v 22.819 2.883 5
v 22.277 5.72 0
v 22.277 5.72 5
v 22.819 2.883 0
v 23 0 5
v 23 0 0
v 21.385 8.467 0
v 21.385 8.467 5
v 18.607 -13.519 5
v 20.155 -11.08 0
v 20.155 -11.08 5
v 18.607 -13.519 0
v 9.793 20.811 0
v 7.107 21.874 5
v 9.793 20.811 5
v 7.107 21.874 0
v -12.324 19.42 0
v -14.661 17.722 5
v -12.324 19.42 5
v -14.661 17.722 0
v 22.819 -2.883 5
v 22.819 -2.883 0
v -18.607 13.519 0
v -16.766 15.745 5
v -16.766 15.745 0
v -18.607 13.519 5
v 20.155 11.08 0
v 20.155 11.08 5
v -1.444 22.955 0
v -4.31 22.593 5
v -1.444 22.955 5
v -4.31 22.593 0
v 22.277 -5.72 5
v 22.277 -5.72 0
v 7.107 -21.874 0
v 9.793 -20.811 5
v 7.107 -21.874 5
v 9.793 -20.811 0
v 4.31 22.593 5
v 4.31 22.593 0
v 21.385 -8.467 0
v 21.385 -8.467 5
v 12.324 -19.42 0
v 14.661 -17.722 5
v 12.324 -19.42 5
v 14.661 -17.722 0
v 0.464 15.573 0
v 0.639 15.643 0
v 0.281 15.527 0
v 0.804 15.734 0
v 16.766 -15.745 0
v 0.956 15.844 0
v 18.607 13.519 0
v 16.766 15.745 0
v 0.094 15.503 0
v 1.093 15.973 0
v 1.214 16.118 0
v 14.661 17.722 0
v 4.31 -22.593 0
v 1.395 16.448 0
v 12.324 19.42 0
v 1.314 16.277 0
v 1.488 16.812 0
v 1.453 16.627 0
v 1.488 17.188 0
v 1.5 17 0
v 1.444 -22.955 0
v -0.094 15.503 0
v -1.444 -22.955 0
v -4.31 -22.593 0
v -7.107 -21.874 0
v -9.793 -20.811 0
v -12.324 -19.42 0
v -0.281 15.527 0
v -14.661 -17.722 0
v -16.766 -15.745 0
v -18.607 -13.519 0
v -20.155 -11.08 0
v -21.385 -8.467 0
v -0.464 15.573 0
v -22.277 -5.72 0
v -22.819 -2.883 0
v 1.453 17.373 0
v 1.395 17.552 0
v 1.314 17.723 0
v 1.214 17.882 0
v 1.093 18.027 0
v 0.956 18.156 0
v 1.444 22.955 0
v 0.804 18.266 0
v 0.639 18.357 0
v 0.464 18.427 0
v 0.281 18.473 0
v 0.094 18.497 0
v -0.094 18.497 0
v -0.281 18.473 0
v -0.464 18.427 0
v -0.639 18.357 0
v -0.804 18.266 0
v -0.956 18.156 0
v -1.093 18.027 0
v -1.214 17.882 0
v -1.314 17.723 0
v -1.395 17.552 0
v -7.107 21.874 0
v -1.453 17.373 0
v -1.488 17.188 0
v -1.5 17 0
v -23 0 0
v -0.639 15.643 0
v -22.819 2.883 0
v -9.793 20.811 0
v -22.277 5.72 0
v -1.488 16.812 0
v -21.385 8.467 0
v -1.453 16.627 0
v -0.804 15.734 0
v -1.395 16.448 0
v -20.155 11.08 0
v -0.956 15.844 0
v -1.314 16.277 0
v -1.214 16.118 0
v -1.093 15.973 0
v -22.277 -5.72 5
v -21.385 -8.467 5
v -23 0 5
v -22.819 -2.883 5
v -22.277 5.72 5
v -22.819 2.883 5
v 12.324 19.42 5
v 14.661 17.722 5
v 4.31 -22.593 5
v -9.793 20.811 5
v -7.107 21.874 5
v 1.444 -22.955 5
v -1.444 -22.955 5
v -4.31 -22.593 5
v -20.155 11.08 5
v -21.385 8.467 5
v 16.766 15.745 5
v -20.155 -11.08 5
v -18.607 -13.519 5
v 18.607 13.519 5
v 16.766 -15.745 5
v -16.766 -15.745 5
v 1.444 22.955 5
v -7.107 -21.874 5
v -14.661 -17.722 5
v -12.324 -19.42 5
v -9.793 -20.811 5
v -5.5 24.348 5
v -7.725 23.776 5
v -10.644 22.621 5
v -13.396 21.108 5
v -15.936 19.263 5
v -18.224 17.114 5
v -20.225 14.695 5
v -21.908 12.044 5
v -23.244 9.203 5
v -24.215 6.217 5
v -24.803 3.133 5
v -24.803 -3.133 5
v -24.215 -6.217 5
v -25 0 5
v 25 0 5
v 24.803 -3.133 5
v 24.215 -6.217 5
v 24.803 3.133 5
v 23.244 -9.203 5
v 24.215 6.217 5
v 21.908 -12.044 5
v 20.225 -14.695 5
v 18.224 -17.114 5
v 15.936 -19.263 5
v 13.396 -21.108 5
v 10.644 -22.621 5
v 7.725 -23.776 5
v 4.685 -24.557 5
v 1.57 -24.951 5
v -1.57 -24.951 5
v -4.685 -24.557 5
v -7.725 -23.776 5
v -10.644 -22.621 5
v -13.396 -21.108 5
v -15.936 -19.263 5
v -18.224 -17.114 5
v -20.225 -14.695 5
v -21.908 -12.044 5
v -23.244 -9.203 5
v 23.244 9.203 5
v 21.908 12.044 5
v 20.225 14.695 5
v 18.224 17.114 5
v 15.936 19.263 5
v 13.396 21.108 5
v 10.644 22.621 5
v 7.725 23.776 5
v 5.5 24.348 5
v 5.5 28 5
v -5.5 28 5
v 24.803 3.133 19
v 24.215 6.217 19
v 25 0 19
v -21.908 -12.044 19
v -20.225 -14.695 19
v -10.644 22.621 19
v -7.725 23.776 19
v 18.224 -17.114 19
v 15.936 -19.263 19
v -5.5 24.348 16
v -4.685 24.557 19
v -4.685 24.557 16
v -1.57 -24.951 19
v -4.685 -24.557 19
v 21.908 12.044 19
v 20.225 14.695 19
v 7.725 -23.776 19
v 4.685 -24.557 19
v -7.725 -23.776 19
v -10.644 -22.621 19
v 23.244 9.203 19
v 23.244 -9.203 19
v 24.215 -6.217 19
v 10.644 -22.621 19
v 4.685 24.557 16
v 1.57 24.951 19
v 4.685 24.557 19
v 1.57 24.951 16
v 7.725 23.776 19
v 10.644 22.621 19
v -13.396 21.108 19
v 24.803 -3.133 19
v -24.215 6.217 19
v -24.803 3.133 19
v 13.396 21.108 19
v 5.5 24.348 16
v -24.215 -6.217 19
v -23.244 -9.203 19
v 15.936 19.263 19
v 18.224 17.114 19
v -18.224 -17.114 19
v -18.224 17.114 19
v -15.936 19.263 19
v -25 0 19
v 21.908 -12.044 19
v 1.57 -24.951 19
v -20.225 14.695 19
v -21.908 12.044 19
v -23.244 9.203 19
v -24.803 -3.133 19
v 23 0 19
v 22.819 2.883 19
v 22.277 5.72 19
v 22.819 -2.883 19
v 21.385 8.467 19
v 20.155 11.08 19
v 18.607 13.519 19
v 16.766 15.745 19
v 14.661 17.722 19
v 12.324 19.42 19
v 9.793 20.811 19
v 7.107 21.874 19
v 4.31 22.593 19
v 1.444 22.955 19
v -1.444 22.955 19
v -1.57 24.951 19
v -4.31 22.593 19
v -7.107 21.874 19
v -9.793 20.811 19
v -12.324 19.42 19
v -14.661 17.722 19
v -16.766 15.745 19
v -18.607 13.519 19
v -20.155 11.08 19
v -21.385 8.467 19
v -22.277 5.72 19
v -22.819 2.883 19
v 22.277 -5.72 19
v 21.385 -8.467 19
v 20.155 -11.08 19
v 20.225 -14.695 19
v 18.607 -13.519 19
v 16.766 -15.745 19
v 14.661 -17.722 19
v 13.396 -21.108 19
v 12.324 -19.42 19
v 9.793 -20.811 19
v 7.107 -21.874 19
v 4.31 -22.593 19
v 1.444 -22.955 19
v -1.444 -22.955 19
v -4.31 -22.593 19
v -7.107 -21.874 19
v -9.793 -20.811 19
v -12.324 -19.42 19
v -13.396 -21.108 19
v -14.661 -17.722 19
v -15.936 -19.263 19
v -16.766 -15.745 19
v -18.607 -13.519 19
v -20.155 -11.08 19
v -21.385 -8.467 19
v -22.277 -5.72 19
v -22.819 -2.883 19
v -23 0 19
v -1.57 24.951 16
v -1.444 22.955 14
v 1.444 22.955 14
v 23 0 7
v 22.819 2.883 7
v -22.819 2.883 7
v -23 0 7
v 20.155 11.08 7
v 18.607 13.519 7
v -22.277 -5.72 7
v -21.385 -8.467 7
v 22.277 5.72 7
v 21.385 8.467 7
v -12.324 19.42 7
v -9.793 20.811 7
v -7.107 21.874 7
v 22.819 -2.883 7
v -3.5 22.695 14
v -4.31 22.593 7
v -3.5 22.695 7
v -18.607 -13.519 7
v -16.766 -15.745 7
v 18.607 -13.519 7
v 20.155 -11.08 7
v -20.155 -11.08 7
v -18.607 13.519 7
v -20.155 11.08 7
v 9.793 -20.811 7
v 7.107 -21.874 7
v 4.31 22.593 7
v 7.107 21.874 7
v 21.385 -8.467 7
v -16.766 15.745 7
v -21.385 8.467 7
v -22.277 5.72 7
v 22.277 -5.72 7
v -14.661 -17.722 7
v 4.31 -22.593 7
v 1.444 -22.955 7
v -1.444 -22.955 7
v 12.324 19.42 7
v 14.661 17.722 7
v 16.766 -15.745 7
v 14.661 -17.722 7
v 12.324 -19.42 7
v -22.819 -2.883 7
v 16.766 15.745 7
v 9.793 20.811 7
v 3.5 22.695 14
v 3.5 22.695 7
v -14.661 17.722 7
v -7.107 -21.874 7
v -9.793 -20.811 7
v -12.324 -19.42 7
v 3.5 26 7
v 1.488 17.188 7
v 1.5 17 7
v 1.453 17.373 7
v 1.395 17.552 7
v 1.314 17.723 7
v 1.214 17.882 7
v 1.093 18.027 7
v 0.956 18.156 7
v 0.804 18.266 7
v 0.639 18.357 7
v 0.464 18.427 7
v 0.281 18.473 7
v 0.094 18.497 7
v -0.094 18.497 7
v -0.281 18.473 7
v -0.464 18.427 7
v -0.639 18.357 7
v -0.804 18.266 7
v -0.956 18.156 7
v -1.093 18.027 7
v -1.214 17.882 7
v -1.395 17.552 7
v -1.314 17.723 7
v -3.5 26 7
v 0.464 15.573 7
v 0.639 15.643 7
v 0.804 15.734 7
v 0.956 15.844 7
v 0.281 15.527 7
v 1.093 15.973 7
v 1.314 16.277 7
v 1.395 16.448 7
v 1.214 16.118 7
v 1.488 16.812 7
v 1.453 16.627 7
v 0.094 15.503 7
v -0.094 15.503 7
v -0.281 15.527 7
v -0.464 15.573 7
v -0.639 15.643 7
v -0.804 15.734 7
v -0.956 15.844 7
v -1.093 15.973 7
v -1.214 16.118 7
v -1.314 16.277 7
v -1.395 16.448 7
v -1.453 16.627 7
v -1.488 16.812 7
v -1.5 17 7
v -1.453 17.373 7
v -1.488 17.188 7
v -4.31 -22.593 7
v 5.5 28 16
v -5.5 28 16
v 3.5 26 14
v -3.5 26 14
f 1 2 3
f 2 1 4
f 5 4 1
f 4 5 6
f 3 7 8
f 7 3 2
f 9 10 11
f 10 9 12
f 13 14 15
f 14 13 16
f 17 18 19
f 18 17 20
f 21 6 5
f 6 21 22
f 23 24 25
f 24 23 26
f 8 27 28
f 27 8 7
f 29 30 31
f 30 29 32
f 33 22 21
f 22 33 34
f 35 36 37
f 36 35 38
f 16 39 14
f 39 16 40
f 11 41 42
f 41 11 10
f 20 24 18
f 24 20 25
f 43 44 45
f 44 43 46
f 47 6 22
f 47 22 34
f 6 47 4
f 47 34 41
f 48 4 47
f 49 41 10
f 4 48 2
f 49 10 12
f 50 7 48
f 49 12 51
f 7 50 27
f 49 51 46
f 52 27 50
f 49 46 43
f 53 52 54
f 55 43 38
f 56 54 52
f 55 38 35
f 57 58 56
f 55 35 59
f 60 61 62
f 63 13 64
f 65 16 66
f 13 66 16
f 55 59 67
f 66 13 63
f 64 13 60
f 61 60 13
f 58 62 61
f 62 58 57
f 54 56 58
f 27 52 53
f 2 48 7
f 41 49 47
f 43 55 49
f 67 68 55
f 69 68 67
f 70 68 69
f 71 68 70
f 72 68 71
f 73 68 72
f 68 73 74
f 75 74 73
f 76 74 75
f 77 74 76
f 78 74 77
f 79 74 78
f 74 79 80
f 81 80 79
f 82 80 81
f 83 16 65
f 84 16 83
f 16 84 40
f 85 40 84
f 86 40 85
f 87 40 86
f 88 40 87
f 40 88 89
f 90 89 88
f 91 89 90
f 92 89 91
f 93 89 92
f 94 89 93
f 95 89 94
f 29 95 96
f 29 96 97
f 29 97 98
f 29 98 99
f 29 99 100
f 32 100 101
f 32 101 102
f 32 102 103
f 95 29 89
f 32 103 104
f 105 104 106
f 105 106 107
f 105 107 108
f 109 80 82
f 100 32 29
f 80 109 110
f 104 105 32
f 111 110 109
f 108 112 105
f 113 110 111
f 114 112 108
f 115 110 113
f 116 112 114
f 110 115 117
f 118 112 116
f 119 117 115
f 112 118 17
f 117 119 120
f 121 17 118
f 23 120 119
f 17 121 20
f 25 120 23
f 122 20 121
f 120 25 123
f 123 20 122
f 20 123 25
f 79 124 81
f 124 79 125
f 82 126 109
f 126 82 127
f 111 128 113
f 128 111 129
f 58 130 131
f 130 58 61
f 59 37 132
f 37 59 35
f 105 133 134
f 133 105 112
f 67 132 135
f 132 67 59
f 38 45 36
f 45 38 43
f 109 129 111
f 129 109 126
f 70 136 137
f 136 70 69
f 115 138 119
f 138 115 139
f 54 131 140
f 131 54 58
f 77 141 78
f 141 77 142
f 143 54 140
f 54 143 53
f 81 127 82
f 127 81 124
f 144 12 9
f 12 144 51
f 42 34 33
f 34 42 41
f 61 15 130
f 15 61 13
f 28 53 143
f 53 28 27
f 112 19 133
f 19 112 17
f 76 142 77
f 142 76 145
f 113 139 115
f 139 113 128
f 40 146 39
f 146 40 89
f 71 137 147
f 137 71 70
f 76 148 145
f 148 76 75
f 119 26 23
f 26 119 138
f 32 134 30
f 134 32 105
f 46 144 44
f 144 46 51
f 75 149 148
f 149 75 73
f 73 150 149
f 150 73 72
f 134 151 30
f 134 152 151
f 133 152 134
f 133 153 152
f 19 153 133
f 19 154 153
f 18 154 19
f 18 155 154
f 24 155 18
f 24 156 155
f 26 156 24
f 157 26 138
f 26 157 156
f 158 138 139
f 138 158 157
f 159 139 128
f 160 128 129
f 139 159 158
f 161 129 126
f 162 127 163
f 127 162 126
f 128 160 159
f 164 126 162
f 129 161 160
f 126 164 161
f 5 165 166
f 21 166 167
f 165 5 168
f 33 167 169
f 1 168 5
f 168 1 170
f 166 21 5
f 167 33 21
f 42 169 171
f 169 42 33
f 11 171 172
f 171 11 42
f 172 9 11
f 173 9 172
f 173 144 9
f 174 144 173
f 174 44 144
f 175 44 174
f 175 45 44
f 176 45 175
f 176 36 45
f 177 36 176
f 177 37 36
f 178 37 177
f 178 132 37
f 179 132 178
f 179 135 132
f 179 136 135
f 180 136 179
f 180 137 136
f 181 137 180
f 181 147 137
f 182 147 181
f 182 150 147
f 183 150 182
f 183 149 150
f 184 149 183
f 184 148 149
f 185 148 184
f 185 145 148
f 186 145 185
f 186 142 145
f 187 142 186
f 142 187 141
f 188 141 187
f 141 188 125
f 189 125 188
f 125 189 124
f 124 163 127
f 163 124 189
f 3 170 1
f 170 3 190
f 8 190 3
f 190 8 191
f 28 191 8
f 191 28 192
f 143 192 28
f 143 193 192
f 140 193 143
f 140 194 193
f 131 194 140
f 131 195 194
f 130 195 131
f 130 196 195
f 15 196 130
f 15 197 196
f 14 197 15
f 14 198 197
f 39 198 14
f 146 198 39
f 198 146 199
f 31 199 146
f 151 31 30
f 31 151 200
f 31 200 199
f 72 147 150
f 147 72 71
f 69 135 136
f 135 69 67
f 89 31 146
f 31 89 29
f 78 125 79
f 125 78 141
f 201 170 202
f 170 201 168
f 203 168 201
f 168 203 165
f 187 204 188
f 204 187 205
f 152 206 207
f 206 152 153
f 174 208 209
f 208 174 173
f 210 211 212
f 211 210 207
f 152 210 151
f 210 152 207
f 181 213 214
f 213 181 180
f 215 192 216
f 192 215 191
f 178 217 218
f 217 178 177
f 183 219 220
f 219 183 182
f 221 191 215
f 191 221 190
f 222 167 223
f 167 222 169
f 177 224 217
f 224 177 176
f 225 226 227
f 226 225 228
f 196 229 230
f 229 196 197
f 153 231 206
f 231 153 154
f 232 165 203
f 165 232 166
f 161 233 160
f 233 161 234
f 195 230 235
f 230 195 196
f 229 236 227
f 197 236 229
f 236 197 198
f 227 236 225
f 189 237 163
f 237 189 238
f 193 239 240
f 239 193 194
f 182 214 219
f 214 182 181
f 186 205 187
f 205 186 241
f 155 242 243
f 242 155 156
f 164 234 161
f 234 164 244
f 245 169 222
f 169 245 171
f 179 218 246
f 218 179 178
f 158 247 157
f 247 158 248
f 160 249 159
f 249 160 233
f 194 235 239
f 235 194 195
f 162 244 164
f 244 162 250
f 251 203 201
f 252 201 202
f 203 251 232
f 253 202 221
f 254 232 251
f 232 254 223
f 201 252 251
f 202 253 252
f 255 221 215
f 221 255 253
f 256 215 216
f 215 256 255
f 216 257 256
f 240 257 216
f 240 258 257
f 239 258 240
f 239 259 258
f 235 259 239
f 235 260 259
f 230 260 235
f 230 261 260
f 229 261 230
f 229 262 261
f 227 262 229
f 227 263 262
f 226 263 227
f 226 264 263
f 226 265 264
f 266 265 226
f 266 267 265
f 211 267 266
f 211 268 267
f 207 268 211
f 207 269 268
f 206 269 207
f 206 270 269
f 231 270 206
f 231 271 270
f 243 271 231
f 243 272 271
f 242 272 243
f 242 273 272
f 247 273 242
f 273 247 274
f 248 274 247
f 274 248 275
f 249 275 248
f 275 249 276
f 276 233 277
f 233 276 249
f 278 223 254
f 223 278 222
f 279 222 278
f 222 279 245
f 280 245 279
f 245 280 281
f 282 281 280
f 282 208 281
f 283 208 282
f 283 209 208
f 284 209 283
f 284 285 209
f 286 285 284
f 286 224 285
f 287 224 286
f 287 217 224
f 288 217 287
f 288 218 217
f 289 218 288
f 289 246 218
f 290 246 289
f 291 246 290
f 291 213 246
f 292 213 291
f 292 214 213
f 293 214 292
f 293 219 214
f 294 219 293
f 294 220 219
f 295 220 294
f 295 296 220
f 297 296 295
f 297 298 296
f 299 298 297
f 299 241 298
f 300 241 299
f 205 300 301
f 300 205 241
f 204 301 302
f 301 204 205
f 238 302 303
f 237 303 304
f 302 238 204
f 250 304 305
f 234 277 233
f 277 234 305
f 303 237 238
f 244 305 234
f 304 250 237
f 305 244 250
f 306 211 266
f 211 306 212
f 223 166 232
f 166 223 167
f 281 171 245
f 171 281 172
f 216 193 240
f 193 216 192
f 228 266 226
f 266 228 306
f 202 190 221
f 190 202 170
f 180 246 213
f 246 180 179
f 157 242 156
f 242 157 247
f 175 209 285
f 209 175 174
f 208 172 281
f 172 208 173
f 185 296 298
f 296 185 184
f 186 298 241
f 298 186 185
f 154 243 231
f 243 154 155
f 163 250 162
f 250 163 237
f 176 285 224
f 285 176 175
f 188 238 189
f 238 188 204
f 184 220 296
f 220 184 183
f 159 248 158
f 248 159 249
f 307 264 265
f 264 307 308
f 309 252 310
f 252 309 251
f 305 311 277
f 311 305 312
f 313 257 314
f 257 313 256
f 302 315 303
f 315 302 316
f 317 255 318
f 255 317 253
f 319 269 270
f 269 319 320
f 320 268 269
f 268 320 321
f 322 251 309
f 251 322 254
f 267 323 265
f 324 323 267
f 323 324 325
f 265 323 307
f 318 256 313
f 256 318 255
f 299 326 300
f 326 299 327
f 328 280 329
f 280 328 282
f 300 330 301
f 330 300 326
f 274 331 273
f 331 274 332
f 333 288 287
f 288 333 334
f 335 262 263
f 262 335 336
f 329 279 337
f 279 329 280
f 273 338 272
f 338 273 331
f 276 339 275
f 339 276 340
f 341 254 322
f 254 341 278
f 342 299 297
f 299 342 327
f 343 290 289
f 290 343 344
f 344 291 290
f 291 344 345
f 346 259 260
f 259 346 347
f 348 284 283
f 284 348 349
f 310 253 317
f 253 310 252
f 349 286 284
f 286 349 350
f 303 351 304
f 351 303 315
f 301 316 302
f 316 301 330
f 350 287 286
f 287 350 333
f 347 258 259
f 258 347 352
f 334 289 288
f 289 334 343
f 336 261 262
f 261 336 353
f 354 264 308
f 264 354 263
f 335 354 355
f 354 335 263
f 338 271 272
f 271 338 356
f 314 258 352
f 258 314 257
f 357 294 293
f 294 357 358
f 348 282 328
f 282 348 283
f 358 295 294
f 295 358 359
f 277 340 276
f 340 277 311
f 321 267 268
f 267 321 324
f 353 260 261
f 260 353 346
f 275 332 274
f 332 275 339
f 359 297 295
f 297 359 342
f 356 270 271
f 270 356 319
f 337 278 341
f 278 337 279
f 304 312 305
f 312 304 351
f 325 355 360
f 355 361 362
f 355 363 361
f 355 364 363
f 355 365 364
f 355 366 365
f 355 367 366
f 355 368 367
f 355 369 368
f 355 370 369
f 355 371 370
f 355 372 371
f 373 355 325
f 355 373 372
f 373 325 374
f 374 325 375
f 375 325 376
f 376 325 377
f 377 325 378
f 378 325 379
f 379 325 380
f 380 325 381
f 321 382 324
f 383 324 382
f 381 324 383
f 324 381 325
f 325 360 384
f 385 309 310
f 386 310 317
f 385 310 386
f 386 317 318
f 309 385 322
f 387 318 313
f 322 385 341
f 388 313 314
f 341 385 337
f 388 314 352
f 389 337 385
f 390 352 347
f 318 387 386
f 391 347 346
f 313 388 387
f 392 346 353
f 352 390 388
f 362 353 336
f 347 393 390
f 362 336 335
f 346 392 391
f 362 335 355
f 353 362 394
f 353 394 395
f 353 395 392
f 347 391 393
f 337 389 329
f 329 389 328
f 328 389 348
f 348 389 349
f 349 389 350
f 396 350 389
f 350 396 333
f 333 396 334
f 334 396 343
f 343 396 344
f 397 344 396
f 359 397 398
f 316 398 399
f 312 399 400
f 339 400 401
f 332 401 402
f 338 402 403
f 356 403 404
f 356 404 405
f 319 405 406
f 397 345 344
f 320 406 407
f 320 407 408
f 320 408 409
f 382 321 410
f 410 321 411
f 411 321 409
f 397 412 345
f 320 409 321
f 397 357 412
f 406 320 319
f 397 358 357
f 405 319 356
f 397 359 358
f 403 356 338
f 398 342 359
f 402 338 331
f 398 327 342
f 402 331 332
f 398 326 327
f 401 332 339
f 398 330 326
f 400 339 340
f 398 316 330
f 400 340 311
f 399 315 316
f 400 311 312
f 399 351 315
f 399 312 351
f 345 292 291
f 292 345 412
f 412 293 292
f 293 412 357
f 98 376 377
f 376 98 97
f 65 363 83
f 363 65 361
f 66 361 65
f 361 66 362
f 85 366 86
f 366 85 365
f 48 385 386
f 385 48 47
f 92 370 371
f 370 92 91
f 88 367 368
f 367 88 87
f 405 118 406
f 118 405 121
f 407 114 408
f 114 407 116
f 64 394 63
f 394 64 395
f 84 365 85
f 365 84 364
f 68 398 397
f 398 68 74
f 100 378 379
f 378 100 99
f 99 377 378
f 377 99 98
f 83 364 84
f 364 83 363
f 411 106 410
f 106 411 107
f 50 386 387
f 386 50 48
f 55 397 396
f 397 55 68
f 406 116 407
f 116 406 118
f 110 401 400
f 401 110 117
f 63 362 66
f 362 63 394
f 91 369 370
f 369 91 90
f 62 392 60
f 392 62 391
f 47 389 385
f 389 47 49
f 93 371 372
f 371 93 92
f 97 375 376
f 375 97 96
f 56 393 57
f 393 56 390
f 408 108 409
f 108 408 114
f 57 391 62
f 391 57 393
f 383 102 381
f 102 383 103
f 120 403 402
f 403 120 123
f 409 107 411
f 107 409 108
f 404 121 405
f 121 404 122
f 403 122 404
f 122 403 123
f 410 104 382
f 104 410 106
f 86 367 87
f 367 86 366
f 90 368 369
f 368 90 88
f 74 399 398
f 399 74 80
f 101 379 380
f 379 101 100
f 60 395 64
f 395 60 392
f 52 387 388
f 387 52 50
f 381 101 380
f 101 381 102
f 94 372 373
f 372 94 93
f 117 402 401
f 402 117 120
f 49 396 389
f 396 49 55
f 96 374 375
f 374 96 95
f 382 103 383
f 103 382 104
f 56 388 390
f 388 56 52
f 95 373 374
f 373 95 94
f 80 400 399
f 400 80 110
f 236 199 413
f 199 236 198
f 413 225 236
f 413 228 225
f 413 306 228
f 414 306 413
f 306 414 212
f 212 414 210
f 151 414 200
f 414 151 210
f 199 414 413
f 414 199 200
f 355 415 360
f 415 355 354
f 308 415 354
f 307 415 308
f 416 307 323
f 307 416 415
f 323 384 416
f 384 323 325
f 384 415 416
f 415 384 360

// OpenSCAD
// file: cap.scad
include <_variables.scad>;


module cap(outer_length = CAP_OUTER_LENGTH)
{
	difference() {
		union() {
			cylinder(d = INNER_DIAMETER, h = CAP_INNER_LENGTH);
			translate([0, 0, CAP_INNER_LENGTH])
				cylinder(d = DIAMETER, h = outer_length);
		}
		linear_extrude(height = CAP_INNER_LENGTH)
			import(file = HEATSINK_SHAPE);
	}
}

cap();
// file: _variables.scad
// Length of the lamp shade
LENGTH = 120;
// Outer diameter of the lamp in general
DIAMETER = 50;
// Material strength
RIM = 2;

$fn=50;

// Thickness of the heatsink copper material
HEATSINK_THICKNESS = 1;
// Source file (DXF) of the 2D profile of the heat sink
HEATSINK_SHAPE = "heatsink-shape.dxf";
// Material thickness of the shade
SHADE_THICKNESS = 2;
// CALCULATED: Inner diameter of the lamp shade
INNER_DIAMETER = DIAMETER - 2*SHADE_THICKNESS;

// Thickness (along the axis of the lamp) of the encoder dial
DIAL_THICKNESS = 10;
// Number of teeth on the encoder dial
DIAL_TEETH = 240;
// Depth of each tooth on the encoder dial
DIAL_TEETH_DEPTH = 1;
// CALCULATED: Angle between two neightbouring teeth on the encoder dial
DIAL_TEETH_ANGLE = 360/DIAL_TEETH;

// Source file of the 2D outline of the pcb
PCB_OUTLINE = "./../electronics-design/board-outline.dxf";
// Total thickness of all PCBs with components
PCB_THICKNESS = 10;

// Length (along axis of the lamp) of the "passive" end cap, outside the lamp shade
CAP_OUTER_LENGTH =  5;
// Length (along axis of the lamp) of the "passive" end cap, inside the lamp shade
CAP_INNER_LENGTH = 5;

// Diameter of the hole that the power jack needs in order to protrude through the case
JACK_DRILL_DIAMETER = 5;
// Maximum diameter of that part of the power jack that will be inside the lamp casing
JACK_MAX_DIAMETER = 7;
// Length of that part of the power jack that will be inside the lamp casing
JACK_INNER_LENGTH = 2;
// main file
include <_variables.scad>;
use <cap.scad>;


module case()
{
	outer_length = PCB_THICKNESS + 2*RIM;
	jack_outer_lenght = JACK_MAX_DIAMETER + 2*RIM;

	difference() {
		union() {
			difference() {
				cap(outer_length);

				// Space for the pcb to fit in
				translate([0, 0, CAP_INNER_LENGTH + RIM])
					cylinder(d = INNER_DIAMETER, h = outer_length);

				// A hole where the cables pass through to the LEDs
				translate([0, 17, 0])
					cylinder(d = 3, h = outer_length + CAP_INNER_LENGTH);
			}

			// A box for the power jack
			translate([0, (DIAMETER+JACK_INNER_LENGTH)/2, jack_outer_lenght/2 + CAP_INNER_LENGTH])
				cube([jack_outer_lenght, JACK_INNER_LENGTH + RIM, jack_outer_lenght], center=true);
		}

		// A hole for the power jack inside that box
		translate([0, (JACK_INNER_LENGTH+DIAMETER)/2-RIM, JACK_MAX_DIAMETER/2 + CAP_INNER_LENGTH + RIM])
			#cube([JACK_MAX_DIAMETER, JACK_INNER_LENGTH+RIM, JACK_MAX_DIAMETER], center=true);

		// translate([0, DIAMETER/2 + RIM + JACK_INNER_LENGTH - 1, CAP_INNER_LENGTH + JACK_MAX_DIAMETER/2 + RIM])
		// rotate([90, 0, 0])
		// 	cylinder(d = JACK_DRILL_DIAMETER, h = RIM+2);
	}

}

case();
